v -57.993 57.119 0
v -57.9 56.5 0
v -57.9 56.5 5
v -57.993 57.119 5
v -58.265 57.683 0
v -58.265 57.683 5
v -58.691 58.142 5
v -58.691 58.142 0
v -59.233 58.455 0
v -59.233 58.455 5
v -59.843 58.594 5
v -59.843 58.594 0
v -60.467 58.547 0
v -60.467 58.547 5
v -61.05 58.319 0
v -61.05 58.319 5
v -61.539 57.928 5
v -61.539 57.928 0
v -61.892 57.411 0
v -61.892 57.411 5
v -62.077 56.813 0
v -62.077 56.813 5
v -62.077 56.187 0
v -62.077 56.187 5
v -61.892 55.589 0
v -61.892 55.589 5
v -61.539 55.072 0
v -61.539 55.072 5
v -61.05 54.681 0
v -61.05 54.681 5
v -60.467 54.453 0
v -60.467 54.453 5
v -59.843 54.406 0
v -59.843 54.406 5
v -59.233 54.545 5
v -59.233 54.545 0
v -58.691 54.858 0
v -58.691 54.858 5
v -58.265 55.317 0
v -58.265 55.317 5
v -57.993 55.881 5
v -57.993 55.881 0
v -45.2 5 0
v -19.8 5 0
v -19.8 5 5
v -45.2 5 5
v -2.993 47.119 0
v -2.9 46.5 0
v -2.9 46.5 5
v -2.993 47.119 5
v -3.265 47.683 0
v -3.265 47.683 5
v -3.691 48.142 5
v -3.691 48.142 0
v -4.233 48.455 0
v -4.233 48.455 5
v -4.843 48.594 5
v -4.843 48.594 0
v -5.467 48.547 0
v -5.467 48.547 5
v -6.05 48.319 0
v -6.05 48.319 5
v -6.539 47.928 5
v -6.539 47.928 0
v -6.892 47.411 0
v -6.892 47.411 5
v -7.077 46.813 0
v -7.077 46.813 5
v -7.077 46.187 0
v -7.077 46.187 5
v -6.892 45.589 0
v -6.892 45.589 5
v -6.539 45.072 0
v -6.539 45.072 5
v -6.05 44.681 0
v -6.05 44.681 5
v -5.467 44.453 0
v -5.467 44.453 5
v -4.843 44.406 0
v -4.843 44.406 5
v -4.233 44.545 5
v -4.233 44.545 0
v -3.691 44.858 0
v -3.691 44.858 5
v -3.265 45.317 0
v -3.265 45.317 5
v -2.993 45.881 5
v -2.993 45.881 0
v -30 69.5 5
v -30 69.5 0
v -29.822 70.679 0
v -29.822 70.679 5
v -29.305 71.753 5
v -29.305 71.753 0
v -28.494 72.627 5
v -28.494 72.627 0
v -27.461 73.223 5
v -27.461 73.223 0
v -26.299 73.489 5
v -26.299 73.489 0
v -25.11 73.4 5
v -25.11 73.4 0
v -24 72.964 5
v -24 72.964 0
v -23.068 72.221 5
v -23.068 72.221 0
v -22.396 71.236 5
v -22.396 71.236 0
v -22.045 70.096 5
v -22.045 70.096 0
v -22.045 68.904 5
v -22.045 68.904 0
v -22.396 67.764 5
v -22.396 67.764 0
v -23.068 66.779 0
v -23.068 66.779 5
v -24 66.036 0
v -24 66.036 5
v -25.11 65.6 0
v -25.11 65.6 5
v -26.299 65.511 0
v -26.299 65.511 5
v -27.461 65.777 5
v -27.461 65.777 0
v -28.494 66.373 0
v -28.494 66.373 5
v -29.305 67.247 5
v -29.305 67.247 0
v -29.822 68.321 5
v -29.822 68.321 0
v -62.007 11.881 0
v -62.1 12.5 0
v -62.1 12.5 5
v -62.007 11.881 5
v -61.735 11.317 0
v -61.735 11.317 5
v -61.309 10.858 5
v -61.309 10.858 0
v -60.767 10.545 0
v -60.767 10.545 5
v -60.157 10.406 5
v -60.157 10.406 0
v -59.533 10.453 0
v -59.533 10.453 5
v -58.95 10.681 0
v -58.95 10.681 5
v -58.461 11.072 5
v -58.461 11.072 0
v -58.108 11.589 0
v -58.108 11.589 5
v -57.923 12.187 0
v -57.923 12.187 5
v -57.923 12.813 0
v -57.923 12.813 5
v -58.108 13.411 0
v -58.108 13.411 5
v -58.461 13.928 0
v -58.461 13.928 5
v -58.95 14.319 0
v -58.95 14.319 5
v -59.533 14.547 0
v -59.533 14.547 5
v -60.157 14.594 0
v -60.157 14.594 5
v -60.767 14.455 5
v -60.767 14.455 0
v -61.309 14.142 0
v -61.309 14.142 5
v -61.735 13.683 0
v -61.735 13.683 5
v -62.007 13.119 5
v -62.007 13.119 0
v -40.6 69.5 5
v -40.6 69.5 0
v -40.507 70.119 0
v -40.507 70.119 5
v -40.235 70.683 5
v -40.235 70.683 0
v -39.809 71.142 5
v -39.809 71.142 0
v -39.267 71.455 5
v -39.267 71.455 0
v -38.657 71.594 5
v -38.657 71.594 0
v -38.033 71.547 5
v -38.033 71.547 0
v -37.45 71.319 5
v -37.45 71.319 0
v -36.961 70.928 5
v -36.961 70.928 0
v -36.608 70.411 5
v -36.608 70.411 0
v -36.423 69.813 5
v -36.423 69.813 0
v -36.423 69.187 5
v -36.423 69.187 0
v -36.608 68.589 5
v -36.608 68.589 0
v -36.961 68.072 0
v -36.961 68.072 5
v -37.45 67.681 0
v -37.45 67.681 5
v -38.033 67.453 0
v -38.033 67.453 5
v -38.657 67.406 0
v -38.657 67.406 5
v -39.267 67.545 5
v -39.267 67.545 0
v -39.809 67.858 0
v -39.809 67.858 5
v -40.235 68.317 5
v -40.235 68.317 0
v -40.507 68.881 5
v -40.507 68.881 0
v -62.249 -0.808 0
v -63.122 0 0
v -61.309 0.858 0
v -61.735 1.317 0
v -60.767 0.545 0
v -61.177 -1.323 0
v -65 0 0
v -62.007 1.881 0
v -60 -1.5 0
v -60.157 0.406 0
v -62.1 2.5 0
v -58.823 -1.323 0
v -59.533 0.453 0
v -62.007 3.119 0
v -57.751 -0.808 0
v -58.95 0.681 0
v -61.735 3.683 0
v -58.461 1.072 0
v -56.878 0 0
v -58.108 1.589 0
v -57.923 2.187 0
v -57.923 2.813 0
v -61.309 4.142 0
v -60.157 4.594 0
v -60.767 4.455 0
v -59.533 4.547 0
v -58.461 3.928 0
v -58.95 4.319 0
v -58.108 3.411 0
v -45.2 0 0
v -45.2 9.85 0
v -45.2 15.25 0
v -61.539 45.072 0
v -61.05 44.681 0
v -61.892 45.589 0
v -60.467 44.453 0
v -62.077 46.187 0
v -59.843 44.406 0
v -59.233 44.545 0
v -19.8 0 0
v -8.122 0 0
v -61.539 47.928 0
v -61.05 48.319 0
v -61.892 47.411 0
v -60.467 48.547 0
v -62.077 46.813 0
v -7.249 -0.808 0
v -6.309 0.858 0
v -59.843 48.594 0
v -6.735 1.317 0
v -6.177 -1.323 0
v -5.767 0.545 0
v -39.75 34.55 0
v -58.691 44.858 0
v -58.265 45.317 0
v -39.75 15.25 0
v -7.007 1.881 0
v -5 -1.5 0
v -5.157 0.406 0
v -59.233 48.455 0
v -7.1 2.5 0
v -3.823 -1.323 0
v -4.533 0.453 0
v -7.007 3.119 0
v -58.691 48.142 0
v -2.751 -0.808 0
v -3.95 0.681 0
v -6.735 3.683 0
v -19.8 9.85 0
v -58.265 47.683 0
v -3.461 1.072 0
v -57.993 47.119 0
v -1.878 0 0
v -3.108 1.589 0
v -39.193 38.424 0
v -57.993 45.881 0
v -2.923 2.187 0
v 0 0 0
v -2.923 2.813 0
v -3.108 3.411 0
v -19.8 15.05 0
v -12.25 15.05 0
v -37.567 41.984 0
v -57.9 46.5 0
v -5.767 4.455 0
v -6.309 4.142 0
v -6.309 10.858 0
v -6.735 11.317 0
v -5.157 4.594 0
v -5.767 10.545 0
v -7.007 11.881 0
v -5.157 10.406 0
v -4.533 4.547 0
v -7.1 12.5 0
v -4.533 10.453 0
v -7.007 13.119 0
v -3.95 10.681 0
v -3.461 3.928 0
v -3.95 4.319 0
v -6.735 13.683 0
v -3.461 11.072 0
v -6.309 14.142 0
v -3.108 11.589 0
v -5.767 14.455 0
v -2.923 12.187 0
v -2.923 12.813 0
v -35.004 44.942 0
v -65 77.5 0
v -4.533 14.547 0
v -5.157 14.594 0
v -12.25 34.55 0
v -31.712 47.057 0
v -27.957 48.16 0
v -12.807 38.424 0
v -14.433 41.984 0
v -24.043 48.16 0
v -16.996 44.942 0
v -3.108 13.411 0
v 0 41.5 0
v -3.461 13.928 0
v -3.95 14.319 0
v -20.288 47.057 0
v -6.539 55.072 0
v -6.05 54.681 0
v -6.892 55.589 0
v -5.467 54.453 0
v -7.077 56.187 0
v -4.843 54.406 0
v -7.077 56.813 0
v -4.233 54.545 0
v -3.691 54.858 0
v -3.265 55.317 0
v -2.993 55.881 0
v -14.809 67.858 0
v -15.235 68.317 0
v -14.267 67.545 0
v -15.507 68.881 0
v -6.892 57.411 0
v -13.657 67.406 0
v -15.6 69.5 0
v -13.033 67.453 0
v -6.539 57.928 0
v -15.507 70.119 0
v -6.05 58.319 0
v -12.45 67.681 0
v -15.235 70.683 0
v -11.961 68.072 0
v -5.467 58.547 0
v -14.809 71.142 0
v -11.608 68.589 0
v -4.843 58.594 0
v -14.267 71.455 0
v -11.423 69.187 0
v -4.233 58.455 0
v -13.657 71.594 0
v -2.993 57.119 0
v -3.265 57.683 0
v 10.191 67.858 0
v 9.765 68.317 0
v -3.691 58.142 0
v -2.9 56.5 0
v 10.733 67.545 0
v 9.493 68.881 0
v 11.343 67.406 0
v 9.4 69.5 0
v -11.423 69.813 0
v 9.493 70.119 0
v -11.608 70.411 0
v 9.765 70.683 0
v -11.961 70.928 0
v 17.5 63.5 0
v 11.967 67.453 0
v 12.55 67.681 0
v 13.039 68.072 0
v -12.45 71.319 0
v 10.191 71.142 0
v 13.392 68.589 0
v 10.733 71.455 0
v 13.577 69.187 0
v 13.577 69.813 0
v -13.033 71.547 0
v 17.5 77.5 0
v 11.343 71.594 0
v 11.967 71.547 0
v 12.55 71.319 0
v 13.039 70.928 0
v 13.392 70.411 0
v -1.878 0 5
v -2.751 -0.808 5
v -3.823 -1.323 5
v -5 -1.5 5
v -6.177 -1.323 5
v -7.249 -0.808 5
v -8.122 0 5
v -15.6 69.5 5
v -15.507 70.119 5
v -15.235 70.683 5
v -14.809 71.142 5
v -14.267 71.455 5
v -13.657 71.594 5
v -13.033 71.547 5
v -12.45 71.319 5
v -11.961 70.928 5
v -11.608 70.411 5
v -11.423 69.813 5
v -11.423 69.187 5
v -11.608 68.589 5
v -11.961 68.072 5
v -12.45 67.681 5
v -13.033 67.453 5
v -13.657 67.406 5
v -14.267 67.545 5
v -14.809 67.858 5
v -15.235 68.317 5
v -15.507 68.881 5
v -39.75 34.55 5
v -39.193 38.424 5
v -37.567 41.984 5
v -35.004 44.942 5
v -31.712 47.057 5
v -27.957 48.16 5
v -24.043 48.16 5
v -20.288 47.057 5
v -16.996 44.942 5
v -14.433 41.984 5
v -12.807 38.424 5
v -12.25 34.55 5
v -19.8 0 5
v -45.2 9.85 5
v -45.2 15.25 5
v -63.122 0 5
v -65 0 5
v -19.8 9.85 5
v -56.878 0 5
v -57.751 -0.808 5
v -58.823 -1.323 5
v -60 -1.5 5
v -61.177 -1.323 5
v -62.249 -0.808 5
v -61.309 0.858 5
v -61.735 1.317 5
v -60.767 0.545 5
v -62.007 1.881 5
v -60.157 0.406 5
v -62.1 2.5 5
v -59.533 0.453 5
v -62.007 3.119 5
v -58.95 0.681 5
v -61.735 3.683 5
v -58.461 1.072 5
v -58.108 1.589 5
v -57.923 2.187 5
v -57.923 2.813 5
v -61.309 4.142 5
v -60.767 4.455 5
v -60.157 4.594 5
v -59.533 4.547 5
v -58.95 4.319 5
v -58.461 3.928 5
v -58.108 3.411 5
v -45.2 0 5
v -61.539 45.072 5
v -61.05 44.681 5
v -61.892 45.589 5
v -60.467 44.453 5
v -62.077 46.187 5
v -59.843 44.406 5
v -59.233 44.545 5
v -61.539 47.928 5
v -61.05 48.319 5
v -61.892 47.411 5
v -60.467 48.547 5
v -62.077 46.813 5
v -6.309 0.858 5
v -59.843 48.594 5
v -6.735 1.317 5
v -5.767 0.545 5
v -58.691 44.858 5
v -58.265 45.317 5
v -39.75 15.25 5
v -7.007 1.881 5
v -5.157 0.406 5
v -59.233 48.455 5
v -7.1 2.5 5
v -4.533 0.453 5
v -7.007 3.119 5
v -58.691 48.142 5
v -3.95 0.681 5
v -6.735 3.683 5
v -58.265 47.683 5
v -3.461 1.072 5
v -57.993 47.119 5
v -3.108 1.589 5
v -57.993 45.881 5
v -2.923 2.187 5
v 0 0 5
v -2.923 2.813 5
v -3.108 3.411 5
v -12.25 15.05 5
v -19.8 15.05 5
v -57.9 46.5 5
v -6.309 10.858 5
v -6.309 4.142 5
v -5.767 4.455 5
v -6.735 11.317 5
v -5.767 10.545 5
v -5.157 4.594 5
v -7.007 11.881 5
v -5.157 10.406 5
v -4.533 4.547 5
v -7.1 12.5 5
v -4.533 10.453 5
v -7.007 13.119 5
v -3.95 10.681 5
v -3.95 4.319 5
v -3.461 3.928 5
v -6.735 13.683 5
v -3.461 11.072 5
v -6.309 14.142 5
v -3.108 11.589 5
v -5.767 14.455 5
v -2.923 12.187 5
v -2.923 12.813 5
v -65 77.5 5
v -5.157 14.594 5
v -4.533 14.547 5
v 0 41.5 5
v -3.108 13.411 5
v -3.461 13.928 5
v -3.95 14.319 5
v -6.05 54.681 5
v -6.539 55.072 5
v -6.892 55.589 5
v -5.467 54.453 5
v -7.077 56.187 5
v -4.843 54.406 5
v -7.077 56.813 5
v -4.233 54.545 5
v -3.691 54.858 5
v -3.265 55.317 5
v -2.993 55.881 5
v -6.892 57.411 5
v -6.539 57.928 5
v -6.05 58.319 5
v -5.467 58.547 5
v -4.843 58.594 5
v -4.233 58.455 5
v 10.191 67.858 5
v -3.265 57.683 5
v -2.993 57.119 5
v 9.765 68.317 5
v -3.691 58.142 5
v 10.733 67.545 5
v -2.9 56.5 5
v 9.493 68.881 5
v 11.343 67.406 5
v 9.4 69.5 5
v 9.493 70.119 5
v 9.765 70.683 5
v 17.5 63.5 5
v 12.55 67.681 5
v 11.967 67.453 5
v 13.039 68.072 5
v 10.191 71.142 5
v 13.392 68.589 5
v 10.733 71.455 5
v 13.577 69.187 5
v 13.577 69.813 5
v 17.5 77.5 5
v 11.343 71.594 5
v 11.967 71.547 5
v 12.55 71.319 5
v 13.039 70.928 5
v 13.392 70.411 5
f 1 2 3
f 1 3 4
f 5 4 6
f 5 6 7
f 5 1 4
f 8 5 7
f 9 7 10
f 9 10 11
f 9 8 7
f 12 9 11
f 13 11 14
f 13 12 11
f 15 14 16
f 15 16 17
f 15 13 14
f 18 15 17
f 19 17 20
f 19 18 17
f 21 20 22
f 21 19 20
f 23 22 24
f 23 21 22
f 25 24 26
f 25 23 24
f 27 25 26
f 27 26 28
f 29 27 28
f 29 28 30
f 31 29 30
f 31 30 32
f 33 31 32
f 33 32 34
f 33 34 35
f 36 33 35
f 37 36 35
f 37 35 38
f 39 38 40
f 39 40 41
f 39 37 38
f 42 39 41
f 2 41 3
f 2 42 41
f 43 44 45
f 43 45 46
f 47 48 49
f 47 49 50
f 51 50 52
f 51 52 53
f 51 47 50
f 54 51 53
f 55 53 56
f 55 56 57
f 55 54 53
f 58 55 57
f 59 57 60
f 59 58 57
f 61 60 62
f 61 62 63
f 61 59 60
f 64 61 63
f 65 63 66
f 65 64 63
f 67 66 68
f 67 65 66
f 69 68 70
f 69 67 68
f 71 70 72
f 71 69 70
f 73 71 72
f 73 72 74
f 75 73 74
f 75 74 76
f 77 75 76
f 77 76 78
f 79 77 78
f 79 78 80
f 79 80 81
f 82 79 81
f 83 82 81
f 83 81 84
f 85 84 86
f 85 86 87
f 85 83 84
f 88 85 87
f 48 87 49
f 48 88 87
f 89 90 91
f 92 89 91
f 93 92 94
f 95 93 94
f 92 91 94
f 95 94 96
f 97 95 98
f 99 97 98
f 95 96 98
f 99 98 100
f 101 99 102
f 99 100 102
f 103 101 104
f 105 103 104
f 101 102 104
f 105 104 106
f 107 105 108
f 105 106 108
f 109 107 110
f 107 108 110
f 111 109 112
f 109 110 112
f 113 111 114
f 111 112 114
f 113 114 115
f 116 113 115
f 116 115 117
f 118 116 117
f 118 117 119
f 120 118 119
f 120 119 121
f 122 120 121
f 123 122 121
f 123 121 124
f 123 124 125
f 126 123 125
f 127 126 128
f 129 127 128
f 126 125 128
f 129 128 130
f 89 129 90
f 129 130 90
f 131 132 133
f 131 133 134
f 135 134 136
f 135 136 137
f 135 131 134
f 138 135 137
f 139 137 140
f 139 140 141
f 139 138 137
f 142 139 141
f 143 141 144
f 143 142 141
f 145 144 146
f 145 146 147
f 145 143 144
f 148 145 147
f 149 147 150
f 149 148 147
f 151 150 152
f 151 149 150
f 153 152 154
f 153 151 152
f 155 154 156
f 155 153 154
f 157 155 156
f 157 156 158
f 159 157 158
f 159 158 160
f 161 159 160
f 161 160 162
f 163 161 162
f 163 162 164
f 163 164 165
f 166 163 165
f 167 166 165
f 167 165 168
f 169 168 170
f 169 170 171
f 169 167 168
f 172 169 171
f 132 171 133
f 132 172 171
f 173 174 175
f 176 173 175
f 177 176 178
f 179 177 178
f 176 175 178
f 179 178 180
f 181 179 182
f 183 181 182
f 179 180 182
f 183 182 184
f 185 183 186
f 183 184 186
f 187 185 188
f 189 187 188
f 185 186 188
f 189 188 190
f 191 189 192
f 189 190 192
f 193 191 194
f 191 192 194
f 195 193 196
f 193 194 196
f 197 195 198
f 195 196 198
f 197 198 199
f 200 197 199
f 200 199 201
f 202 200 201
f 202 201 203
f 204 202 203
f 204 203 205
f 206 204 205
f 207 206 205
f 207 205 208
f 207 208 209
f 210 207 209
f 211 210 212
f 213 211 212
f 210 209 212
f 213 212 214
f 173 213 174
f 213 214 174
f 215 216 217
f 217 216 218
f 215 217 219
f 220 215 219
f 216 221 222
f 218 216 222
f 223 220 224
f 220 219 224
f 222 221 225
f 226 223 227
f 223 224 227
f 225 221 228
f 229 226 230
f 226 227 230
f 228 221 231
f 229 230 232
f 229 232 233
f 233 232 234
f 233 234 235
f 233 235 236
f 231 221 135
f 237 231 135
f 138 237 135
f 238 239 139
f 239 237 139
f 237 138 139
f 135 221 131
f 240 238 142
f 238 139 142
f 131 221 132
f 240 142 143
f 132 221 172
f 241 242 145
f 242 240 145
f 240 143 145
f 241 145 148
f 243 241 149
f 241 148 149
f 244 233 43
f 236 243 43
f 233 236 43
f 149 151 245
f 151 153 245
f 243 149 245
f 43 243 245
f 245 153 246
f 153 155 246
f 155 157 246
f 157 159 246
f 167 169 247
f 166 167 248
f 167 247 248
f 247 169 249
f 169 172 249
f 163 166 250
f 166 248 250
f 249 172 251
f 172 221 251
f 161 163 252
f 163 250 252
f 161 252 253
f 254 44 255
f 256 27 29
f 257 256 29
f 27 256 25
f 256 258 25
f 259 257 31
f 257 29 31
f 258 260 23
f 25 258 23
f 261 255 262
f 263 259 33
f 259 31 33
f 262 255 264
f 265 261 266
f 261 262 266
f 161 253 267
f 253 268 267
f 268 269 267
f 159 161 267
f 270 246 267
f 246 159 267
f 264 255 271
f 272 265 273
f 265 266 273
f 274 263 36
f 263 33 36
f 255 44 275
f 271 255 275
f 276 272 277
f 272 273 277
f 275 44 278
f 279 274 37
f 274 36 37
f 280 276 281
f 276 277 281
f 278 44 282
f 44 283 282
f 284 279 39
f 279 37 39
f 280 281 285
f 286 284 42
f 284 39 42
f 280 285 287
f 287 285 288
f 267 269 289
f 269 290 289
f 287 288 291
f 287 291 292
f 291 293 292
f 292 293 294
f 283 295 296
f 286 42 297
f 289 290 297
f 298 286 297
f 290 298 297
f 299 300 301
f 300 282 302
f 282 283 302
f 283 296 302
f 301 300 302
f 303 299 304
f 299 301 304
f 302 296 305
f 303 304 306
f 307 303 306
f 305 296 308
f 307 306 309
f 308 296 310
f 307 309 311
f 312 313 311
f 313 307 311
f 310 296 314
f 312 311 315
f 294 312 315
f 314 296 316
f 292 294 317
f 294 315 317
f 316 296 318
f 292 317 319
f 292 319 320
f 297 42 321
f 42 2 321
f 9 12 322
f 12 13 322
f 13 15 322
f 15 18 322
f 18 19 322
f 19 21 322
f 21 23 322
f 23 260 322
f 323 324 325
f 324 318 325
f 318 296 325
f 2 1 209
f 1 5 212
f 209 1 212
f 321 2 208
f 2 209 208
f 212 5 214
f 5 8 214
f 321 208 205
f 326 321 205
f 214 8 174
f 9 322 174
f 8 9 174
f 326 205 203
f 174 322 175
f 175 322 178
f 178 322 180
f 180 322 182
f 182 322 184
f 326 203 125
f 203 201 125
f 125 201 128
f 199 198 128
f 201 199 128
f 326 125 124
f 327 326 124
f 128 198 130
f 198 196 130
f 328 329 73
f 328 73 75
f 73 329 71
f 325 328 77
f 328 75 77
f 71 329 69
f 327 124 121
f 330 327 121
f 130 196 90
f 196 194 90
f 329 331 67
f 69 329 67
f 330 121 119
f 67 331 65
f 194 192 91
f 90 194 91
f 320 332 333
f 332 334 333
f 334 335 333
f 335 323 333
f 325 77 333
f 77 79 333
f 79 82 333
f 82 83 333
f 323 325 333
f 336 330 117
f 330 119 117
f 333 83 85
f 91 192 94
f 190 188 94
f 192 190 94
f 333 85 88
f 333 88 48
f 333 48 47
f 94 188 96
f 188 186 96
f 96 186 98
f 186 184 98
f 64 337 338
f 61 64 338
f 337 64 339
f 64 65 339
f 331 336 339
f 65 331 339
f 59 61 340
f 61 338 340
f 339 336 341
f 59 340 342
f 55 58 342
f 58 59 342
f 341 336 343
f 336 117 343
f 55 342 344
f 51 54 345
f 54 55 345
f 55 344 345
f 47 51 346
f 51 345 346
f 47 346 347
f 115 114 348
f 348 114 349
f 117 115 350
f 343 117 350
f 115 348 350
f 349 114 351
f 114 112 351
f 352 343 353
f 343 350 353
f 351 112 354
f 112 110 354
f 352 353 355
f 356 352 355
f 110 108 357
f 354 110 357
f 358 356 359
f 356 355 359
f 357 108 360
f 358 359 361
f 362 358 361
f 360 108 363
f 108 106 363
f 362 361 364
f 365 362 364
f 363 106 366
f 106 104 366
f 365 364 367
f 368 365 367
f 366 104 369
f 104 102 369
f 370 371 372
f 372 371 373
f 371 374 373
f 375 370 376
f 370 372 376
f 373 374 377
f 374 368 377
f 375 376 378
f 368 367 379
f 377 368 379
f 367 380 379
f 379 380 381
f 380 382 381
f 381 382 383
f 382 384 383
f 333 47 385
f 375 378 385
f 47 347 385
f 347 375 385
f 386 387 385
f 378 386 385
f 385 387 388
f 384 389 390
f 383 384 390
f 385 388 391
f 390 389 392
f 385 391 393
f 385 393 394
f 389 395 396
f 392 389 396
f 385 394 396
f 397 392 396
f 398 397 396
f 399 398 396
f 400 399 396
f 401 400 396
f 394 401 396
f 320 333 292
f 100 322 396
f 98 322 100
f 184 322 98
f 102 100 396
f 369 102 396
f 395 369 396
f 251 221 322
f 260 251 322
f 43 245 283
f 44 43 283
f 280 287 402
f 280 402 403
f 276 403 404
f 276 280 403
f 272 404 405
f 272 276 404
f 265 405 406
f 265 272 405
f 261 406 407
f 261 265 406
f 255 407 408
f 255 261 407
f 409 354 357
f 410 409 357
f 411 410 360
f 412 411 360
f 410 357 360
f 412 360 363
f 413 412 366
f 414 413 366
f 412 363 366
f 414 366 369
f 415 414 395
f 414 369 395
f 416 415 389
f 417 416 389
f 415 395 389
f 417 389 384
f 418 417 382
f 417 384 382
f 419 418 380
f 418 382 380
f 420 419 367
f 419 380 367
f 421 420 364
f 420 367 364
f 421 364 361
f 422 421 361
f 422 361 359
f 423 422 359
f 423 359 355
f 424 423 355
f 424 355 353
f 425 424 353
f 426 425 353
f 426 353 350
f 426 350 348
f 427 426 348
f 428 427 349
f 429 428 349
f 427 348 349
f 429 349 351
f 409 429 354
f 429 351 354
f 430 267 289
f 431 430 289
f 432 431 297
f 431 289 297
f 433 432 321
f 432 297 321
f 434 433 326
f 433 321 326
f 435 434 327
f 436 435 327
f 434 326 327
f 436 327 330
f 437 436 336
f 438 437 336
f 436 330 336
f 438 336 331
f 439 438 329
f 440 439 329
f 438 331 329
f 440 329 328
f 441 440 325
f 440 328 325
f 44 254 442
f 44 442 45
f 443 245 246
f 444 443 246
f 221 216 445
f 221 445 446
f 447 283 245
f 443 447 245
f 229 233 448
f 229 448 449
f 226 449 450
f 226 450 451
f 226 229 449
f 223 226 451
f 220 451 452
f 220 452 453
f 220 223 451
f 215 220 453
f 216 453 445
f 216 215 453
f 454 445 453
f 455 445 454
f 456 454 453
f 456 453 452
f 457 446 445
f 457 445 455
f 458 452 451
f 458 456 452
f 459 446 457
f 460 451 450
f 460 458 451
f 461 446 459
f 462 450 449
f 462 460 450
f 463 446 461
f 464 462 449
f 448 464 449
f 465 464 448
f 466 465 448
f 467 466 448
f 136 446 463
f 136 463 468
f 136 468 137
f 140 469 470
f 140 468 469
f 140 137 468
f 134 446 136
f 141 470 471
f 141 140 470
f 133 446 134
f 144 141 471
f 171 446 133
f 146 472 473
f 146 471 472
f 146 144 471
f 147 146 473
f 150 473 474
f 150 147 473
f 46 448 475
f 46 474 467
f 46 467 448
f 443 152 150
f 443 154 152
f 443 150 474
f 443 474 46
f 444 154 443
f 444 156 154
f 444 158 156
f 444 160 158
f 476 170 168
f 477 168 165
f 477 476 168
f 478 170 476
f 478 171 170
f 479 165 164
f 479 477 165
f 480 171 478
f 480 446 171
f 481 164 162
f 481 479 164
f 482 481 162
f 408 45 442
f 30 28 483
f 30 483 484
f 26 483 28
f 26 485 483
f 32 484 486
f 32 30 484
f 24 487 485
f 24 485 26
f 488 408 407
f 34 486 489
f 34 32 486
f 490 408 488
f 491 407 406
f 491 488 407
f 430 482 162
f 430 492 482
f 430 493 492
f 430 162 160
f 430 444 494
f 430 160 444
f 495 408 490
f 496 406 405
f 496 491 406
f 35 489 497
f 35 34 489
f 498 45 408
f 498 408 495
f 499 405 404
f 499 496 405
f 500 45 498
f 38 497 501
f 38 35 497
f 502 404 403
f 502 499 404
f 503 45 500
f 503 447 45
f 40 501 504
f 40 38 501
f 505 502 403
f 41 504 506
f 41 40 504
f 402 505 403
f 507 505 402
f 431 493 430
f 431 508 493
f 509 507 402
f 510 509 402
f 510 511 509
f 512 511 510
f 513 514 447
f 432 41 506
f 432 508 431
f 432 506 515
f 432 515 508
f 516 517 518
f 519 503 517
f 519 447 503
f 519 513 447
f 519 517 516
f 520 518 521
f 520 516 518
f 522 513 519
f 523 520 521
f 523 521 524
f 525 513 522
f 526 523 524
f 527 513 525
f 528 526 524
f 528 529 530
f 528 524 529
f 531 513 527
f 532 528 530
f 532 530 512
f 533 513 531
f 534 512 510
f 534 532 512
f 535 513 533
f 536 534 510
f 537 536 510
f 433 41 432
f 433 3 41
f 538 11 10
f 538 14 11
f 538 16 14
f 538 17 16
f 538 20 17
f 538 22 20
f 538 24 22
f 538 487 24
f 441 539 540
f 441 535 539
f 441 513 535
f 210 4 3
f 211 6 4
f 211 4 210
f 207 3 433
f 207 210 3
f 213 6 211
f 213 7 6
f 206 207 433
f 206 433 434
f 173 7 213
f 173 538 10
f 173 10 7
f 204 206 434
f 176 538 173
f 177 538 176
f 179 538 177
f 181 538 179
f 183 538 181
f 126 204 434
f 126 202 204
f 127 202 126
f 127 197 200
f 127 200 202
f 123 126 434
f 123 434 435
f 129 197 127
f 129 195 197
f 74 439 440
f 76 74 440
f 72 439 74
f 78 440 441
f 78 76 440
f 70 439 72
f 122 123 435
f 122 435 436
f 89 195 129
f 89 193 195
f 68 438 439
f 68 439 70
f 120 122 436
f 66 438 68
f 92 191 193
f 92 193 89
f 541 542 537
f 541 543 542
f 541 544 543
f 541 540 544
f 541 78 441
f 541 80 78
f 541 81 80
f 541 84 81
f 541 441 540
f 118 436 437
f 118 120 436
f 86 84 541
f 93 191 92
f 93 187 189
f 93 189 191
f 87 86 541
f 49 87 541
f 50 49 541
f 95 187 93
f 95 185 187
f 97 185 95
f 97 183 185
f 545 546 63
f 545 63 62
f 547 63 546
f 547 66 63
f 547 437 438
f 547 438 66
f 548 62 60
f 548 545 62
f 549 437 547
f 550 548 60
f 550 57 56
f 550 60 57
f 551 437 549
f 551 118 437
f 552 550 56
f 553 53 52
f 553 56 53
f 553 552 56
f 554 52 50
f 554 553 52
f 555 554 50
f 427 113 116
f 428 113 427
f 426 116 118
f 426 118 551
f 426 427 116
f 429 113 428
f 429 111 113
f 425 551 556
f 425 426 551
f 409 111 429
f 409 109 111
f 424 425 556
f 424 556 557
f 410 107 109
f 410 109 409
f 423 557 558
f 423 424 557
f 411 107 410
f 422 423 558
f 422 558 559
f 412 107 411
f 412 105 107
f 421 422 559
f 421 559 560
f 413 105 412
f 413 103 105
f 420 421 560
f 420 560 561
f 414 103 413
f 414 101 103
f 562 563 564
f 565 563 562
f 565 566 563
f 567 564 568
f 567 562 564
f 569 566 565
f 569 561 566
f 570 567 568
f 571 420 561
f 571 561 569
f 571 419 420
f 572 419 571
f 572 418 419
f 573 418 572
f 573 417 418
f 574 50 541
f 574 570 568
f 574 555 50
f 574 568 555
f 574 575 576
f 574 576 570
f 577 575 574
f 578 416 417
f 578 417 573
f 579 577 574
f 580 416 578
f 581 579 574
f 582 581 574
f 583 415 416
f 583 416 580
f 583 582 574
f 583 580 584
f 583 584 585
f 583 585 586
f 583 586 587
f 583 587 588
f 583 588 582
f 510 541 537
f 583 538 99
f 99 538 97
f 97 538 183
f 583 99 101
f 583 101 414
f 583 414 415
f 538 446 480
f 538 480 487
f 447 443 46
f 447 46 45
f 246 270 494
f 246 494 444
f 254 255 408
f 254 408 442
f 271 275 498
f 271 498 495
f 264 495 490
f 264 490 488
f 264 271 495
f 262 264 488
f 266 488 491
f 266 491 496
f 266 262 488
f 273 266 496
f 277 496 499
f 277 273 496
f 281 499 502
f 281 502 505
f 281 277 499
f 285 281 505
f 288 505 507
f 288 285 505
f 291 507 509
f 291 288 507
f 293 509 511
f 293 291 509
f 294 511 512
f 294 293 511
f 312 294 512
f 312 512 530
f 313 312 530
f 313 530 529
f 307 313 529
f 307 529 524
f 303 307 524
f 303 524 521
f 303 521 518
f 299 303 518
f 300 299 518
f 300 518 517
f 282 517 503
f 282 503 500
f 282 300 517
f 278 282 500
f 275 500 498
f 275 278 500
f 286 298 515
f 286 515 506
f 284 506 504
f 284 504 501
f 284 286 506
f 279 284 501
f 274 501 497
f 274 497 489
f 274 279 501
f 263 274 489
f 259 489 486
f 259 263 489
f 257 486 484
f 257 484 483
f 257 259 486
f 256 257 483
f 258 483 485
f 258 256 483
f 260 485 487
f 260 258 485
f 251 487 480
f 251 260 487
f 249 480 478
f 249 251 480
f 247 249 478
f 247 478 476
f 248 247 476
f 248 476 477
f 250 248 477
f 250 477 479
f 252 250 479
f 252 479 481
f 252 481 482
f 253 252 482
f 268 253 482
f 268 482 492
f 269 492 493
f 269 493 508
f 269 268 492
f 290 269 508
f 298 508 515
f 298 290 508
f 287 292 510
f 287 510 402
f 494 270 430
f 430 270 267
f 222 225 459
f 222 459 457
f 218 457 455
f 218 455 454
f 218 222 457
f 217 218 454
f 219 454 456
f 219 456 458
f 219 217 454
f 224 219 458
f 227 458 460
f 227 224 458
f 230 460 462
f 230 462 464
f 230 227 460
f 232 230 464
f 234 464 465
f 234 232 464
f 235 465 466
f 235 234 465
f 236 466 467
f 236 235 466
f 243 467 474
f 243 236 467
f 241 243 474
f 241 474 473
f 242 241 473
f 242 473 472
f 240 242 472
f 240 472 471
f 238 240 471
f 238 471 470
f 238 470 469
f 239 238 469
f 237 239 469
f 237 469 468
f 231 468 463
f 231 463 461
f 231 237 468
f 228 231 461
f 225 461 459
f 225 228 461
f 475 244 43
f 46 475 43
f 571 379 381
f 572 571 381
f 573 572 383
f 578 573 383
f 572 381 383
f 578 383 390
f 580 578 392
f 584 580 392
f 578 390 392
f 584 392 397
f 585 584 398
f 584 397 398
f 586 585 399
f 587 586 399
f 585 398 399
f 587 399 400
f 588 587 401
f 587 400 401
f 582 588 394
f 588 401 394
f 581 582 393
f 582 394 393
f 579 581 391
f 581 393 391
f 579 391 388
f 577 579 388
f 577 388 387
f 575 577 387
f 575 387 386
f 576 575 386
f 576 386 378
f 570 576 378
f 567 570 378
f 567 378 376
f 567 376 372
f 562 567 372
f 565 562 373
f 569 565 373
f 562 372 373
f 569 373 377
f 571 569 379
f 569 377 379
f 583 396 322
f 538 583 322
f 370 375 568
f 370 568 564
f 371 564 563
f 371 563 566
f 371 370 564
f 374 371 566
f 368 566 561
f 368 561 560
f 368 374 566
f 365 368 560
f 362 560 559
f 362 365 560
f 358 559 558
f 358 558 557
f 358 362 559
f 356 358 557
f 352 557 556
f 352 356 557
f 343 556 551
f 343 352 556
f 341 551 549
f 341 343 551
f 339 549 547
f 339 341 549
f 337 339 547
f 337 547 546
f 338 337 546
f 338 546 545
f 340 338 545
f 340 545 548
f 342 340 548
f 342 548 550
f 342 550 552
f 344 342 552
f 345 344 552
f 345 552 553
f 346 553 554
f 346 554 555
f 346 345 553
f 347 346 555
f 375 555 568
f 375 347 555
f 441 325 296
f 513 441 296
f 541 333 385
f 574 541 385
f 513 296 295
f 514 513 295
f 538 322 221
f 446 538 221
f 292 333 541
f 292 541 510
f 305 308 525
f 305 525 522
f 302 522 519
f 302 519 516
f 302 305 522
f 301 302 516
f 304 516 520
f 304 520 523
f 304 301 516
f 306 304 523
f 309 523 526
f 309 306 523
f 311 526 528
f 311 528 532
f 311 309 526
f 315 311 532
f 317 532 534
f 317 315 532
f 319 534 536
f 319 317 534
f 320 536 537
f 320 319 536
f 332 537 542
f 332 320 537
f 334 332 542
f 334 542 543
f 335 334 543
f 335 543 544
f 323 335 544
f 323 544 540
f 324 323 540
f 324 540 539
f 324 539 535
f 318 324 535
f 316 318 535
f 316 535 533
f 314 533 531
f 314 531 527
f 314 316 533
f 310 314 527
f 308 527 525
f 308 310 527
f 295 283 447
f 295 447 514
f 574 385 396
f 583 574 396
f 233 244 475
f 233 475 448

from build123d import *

# Parameters (mm, degrees)
SKETCH1_R           = 2.1
SKETCH1_W           = 25
SKETCH1_H           = 5.1
BOSS_EXTRUDE1_DEPTH = 5
CUT_EXTRUDE2_DEPTH  = 5
SKETCH4_R           = 2.1
SKETCH4_R_2         = 4
BOSS_EXTRUDE2_DEPTH = 5
SKETCH5_W           = 25.4
SKETCH5_H           = 5
SKETCH5_H_2         = 5.4
CUT_EXTRUDE3_DEPTH  = 10


with BuildPart() as part:
    # Sketch1 → Boss-Extrude1 (new body)
    with BuildSketch(Plane.XY):
        with BuildLine():
            Line((-65, 61.5), (0, 61.5))
            Line((0, 61.5), (0, 0))
            Line((0, 0), (-1.877501001, 0))
            ThreePointArc((-1.877501001, 0), (-5, -1.5), (-8.122498999, 0))
            Line((-8.122498999, 0), (-20, 0))
            Line((-20, 0), (-20, 5))
            Line((-20, 5), (-45, 5))
            Line((-45, 5), (-45, 0))
            Line((-45, 0), (-56.877501001, 0))
            ThreePointArc((-56.877501001, 0), (-60, -1.5), (-63.122498999, 0))
            Line((-63.122498999, 0), (-65, 0))
            Line((-65, 0), (-65, 61.5))
        make_face()
        with Locations((-60, 56.5)):
            Circle(SKETCH1_R, mode=Mode.SUBTRACT)
        with Locations((-5, 56.5)):
            Circle(SKETCH1_R, mode=Mode.SUBTRACT)
        with Locations((-60, 46.5)):
            Circle(SKETCH1_R, mode=Mode.SUBTRACT)
        with Locations((-5, 46.5)):
            Circle(SKETCH1_R, mode=Mode.SUBTRACT)
        with Locations(Location((-5, 12.5, 0), (0, 0, 180))):
            Circle(SKETCH1_R, mode=Mode.SUBTRACT)
        with Locations(Location((-5, 2.5, 0), (0, 0, 180))):
            Circle(SKETCH1_R, mode=Mode.SUBTRACT)
        with Locations(Location((-60, 2.5, 0), (0, 0, 180))):
            Circle(SKETCH1_R, mode=Mode.SUBTRACT)
        with Locations(Location((-60, 12.5, 0), (0, 0, 180))):
            Circle(SKETCH1_R, mode=Mode.SUBTRACT)
        with Locations((-32.5, 12.5)):
            Rectangle(SKETCH1_W, SKETCH1_H, mode=Mode.SUBTRACT)
    extrude(amount=BOSS_EXTRUDE1_DEPTH)

    # Sketch3 → Cut-Extrude2 (cut)
    with BuildSketch(Plane(origin=(0, 0, 0), x_dir=(-1, 0, 0), z_dir=(0, 0, -1))):
        with BuildLine():
            Line((39.75, 15.05), (39.75, 34.55))
            ThreePointArc((39.75, 34.55), (26, 48.3), (12.25, 34.55))
            Line((12.25, 34.55), (12.25, 15.05))
            Line((12.25, 15.05), (39.75, 15.05))
        make_face()
    extrude(amount=-CUT_EXTRUDE2_DEPTH, mode=Mode.SUBTRACT)

    # Sketch4 → Boss-Extrude2 (add)
    with BuildSketch(Plane(origin=(0, 0, 0), x_dir=(-1, 0, 0), z_dir=(0, 0, -1))):
        Polygon((0, 41.5), (-17.5, 63.5), (-17.5, 77.5), (65, 77.5), (65, 61.5), (0, 61.5), align=None)
        with Locations((-11.5, 69.5)):
            Circle(SKETCH4_R, mode=Mode.SUBTRACT)
        with Locations((13.5, 69.5)):
            Circle(SKETCH4_R, mode=Mode.SUBTRACT)
        with Locations((26, 69.5)):
            Circle(SKETCH4_R_2, mode=Mode.SUBTRACT)
        with Locations((38.5, 69.5)):
            Circle(SKETCH4_R, mode=Mode.SUBTRACT)
    extrude(amount=-BOSS_EXTRUDE2_DEPTH)

    # Sketch5 → Cut-Extrude3 (cut)
    with BuildSketch(Plane(origin=(0, 0, 0), x_dir=(-1, 0, 0), z_dir=(0, 0, -1))):
        with Locations((32.5, 2.5)):
            Rectangle(SKETCH5_W, SKETCH5_H)
        with Locations((32.5, 12.55)):
            Rectangle(SKETCH5_W, SKETCH5_H_2)
    extrude(amount=-CUT_EXTRUDE3_DEPTH, mode=Mode.SUBTRACT)


solid = part.part
